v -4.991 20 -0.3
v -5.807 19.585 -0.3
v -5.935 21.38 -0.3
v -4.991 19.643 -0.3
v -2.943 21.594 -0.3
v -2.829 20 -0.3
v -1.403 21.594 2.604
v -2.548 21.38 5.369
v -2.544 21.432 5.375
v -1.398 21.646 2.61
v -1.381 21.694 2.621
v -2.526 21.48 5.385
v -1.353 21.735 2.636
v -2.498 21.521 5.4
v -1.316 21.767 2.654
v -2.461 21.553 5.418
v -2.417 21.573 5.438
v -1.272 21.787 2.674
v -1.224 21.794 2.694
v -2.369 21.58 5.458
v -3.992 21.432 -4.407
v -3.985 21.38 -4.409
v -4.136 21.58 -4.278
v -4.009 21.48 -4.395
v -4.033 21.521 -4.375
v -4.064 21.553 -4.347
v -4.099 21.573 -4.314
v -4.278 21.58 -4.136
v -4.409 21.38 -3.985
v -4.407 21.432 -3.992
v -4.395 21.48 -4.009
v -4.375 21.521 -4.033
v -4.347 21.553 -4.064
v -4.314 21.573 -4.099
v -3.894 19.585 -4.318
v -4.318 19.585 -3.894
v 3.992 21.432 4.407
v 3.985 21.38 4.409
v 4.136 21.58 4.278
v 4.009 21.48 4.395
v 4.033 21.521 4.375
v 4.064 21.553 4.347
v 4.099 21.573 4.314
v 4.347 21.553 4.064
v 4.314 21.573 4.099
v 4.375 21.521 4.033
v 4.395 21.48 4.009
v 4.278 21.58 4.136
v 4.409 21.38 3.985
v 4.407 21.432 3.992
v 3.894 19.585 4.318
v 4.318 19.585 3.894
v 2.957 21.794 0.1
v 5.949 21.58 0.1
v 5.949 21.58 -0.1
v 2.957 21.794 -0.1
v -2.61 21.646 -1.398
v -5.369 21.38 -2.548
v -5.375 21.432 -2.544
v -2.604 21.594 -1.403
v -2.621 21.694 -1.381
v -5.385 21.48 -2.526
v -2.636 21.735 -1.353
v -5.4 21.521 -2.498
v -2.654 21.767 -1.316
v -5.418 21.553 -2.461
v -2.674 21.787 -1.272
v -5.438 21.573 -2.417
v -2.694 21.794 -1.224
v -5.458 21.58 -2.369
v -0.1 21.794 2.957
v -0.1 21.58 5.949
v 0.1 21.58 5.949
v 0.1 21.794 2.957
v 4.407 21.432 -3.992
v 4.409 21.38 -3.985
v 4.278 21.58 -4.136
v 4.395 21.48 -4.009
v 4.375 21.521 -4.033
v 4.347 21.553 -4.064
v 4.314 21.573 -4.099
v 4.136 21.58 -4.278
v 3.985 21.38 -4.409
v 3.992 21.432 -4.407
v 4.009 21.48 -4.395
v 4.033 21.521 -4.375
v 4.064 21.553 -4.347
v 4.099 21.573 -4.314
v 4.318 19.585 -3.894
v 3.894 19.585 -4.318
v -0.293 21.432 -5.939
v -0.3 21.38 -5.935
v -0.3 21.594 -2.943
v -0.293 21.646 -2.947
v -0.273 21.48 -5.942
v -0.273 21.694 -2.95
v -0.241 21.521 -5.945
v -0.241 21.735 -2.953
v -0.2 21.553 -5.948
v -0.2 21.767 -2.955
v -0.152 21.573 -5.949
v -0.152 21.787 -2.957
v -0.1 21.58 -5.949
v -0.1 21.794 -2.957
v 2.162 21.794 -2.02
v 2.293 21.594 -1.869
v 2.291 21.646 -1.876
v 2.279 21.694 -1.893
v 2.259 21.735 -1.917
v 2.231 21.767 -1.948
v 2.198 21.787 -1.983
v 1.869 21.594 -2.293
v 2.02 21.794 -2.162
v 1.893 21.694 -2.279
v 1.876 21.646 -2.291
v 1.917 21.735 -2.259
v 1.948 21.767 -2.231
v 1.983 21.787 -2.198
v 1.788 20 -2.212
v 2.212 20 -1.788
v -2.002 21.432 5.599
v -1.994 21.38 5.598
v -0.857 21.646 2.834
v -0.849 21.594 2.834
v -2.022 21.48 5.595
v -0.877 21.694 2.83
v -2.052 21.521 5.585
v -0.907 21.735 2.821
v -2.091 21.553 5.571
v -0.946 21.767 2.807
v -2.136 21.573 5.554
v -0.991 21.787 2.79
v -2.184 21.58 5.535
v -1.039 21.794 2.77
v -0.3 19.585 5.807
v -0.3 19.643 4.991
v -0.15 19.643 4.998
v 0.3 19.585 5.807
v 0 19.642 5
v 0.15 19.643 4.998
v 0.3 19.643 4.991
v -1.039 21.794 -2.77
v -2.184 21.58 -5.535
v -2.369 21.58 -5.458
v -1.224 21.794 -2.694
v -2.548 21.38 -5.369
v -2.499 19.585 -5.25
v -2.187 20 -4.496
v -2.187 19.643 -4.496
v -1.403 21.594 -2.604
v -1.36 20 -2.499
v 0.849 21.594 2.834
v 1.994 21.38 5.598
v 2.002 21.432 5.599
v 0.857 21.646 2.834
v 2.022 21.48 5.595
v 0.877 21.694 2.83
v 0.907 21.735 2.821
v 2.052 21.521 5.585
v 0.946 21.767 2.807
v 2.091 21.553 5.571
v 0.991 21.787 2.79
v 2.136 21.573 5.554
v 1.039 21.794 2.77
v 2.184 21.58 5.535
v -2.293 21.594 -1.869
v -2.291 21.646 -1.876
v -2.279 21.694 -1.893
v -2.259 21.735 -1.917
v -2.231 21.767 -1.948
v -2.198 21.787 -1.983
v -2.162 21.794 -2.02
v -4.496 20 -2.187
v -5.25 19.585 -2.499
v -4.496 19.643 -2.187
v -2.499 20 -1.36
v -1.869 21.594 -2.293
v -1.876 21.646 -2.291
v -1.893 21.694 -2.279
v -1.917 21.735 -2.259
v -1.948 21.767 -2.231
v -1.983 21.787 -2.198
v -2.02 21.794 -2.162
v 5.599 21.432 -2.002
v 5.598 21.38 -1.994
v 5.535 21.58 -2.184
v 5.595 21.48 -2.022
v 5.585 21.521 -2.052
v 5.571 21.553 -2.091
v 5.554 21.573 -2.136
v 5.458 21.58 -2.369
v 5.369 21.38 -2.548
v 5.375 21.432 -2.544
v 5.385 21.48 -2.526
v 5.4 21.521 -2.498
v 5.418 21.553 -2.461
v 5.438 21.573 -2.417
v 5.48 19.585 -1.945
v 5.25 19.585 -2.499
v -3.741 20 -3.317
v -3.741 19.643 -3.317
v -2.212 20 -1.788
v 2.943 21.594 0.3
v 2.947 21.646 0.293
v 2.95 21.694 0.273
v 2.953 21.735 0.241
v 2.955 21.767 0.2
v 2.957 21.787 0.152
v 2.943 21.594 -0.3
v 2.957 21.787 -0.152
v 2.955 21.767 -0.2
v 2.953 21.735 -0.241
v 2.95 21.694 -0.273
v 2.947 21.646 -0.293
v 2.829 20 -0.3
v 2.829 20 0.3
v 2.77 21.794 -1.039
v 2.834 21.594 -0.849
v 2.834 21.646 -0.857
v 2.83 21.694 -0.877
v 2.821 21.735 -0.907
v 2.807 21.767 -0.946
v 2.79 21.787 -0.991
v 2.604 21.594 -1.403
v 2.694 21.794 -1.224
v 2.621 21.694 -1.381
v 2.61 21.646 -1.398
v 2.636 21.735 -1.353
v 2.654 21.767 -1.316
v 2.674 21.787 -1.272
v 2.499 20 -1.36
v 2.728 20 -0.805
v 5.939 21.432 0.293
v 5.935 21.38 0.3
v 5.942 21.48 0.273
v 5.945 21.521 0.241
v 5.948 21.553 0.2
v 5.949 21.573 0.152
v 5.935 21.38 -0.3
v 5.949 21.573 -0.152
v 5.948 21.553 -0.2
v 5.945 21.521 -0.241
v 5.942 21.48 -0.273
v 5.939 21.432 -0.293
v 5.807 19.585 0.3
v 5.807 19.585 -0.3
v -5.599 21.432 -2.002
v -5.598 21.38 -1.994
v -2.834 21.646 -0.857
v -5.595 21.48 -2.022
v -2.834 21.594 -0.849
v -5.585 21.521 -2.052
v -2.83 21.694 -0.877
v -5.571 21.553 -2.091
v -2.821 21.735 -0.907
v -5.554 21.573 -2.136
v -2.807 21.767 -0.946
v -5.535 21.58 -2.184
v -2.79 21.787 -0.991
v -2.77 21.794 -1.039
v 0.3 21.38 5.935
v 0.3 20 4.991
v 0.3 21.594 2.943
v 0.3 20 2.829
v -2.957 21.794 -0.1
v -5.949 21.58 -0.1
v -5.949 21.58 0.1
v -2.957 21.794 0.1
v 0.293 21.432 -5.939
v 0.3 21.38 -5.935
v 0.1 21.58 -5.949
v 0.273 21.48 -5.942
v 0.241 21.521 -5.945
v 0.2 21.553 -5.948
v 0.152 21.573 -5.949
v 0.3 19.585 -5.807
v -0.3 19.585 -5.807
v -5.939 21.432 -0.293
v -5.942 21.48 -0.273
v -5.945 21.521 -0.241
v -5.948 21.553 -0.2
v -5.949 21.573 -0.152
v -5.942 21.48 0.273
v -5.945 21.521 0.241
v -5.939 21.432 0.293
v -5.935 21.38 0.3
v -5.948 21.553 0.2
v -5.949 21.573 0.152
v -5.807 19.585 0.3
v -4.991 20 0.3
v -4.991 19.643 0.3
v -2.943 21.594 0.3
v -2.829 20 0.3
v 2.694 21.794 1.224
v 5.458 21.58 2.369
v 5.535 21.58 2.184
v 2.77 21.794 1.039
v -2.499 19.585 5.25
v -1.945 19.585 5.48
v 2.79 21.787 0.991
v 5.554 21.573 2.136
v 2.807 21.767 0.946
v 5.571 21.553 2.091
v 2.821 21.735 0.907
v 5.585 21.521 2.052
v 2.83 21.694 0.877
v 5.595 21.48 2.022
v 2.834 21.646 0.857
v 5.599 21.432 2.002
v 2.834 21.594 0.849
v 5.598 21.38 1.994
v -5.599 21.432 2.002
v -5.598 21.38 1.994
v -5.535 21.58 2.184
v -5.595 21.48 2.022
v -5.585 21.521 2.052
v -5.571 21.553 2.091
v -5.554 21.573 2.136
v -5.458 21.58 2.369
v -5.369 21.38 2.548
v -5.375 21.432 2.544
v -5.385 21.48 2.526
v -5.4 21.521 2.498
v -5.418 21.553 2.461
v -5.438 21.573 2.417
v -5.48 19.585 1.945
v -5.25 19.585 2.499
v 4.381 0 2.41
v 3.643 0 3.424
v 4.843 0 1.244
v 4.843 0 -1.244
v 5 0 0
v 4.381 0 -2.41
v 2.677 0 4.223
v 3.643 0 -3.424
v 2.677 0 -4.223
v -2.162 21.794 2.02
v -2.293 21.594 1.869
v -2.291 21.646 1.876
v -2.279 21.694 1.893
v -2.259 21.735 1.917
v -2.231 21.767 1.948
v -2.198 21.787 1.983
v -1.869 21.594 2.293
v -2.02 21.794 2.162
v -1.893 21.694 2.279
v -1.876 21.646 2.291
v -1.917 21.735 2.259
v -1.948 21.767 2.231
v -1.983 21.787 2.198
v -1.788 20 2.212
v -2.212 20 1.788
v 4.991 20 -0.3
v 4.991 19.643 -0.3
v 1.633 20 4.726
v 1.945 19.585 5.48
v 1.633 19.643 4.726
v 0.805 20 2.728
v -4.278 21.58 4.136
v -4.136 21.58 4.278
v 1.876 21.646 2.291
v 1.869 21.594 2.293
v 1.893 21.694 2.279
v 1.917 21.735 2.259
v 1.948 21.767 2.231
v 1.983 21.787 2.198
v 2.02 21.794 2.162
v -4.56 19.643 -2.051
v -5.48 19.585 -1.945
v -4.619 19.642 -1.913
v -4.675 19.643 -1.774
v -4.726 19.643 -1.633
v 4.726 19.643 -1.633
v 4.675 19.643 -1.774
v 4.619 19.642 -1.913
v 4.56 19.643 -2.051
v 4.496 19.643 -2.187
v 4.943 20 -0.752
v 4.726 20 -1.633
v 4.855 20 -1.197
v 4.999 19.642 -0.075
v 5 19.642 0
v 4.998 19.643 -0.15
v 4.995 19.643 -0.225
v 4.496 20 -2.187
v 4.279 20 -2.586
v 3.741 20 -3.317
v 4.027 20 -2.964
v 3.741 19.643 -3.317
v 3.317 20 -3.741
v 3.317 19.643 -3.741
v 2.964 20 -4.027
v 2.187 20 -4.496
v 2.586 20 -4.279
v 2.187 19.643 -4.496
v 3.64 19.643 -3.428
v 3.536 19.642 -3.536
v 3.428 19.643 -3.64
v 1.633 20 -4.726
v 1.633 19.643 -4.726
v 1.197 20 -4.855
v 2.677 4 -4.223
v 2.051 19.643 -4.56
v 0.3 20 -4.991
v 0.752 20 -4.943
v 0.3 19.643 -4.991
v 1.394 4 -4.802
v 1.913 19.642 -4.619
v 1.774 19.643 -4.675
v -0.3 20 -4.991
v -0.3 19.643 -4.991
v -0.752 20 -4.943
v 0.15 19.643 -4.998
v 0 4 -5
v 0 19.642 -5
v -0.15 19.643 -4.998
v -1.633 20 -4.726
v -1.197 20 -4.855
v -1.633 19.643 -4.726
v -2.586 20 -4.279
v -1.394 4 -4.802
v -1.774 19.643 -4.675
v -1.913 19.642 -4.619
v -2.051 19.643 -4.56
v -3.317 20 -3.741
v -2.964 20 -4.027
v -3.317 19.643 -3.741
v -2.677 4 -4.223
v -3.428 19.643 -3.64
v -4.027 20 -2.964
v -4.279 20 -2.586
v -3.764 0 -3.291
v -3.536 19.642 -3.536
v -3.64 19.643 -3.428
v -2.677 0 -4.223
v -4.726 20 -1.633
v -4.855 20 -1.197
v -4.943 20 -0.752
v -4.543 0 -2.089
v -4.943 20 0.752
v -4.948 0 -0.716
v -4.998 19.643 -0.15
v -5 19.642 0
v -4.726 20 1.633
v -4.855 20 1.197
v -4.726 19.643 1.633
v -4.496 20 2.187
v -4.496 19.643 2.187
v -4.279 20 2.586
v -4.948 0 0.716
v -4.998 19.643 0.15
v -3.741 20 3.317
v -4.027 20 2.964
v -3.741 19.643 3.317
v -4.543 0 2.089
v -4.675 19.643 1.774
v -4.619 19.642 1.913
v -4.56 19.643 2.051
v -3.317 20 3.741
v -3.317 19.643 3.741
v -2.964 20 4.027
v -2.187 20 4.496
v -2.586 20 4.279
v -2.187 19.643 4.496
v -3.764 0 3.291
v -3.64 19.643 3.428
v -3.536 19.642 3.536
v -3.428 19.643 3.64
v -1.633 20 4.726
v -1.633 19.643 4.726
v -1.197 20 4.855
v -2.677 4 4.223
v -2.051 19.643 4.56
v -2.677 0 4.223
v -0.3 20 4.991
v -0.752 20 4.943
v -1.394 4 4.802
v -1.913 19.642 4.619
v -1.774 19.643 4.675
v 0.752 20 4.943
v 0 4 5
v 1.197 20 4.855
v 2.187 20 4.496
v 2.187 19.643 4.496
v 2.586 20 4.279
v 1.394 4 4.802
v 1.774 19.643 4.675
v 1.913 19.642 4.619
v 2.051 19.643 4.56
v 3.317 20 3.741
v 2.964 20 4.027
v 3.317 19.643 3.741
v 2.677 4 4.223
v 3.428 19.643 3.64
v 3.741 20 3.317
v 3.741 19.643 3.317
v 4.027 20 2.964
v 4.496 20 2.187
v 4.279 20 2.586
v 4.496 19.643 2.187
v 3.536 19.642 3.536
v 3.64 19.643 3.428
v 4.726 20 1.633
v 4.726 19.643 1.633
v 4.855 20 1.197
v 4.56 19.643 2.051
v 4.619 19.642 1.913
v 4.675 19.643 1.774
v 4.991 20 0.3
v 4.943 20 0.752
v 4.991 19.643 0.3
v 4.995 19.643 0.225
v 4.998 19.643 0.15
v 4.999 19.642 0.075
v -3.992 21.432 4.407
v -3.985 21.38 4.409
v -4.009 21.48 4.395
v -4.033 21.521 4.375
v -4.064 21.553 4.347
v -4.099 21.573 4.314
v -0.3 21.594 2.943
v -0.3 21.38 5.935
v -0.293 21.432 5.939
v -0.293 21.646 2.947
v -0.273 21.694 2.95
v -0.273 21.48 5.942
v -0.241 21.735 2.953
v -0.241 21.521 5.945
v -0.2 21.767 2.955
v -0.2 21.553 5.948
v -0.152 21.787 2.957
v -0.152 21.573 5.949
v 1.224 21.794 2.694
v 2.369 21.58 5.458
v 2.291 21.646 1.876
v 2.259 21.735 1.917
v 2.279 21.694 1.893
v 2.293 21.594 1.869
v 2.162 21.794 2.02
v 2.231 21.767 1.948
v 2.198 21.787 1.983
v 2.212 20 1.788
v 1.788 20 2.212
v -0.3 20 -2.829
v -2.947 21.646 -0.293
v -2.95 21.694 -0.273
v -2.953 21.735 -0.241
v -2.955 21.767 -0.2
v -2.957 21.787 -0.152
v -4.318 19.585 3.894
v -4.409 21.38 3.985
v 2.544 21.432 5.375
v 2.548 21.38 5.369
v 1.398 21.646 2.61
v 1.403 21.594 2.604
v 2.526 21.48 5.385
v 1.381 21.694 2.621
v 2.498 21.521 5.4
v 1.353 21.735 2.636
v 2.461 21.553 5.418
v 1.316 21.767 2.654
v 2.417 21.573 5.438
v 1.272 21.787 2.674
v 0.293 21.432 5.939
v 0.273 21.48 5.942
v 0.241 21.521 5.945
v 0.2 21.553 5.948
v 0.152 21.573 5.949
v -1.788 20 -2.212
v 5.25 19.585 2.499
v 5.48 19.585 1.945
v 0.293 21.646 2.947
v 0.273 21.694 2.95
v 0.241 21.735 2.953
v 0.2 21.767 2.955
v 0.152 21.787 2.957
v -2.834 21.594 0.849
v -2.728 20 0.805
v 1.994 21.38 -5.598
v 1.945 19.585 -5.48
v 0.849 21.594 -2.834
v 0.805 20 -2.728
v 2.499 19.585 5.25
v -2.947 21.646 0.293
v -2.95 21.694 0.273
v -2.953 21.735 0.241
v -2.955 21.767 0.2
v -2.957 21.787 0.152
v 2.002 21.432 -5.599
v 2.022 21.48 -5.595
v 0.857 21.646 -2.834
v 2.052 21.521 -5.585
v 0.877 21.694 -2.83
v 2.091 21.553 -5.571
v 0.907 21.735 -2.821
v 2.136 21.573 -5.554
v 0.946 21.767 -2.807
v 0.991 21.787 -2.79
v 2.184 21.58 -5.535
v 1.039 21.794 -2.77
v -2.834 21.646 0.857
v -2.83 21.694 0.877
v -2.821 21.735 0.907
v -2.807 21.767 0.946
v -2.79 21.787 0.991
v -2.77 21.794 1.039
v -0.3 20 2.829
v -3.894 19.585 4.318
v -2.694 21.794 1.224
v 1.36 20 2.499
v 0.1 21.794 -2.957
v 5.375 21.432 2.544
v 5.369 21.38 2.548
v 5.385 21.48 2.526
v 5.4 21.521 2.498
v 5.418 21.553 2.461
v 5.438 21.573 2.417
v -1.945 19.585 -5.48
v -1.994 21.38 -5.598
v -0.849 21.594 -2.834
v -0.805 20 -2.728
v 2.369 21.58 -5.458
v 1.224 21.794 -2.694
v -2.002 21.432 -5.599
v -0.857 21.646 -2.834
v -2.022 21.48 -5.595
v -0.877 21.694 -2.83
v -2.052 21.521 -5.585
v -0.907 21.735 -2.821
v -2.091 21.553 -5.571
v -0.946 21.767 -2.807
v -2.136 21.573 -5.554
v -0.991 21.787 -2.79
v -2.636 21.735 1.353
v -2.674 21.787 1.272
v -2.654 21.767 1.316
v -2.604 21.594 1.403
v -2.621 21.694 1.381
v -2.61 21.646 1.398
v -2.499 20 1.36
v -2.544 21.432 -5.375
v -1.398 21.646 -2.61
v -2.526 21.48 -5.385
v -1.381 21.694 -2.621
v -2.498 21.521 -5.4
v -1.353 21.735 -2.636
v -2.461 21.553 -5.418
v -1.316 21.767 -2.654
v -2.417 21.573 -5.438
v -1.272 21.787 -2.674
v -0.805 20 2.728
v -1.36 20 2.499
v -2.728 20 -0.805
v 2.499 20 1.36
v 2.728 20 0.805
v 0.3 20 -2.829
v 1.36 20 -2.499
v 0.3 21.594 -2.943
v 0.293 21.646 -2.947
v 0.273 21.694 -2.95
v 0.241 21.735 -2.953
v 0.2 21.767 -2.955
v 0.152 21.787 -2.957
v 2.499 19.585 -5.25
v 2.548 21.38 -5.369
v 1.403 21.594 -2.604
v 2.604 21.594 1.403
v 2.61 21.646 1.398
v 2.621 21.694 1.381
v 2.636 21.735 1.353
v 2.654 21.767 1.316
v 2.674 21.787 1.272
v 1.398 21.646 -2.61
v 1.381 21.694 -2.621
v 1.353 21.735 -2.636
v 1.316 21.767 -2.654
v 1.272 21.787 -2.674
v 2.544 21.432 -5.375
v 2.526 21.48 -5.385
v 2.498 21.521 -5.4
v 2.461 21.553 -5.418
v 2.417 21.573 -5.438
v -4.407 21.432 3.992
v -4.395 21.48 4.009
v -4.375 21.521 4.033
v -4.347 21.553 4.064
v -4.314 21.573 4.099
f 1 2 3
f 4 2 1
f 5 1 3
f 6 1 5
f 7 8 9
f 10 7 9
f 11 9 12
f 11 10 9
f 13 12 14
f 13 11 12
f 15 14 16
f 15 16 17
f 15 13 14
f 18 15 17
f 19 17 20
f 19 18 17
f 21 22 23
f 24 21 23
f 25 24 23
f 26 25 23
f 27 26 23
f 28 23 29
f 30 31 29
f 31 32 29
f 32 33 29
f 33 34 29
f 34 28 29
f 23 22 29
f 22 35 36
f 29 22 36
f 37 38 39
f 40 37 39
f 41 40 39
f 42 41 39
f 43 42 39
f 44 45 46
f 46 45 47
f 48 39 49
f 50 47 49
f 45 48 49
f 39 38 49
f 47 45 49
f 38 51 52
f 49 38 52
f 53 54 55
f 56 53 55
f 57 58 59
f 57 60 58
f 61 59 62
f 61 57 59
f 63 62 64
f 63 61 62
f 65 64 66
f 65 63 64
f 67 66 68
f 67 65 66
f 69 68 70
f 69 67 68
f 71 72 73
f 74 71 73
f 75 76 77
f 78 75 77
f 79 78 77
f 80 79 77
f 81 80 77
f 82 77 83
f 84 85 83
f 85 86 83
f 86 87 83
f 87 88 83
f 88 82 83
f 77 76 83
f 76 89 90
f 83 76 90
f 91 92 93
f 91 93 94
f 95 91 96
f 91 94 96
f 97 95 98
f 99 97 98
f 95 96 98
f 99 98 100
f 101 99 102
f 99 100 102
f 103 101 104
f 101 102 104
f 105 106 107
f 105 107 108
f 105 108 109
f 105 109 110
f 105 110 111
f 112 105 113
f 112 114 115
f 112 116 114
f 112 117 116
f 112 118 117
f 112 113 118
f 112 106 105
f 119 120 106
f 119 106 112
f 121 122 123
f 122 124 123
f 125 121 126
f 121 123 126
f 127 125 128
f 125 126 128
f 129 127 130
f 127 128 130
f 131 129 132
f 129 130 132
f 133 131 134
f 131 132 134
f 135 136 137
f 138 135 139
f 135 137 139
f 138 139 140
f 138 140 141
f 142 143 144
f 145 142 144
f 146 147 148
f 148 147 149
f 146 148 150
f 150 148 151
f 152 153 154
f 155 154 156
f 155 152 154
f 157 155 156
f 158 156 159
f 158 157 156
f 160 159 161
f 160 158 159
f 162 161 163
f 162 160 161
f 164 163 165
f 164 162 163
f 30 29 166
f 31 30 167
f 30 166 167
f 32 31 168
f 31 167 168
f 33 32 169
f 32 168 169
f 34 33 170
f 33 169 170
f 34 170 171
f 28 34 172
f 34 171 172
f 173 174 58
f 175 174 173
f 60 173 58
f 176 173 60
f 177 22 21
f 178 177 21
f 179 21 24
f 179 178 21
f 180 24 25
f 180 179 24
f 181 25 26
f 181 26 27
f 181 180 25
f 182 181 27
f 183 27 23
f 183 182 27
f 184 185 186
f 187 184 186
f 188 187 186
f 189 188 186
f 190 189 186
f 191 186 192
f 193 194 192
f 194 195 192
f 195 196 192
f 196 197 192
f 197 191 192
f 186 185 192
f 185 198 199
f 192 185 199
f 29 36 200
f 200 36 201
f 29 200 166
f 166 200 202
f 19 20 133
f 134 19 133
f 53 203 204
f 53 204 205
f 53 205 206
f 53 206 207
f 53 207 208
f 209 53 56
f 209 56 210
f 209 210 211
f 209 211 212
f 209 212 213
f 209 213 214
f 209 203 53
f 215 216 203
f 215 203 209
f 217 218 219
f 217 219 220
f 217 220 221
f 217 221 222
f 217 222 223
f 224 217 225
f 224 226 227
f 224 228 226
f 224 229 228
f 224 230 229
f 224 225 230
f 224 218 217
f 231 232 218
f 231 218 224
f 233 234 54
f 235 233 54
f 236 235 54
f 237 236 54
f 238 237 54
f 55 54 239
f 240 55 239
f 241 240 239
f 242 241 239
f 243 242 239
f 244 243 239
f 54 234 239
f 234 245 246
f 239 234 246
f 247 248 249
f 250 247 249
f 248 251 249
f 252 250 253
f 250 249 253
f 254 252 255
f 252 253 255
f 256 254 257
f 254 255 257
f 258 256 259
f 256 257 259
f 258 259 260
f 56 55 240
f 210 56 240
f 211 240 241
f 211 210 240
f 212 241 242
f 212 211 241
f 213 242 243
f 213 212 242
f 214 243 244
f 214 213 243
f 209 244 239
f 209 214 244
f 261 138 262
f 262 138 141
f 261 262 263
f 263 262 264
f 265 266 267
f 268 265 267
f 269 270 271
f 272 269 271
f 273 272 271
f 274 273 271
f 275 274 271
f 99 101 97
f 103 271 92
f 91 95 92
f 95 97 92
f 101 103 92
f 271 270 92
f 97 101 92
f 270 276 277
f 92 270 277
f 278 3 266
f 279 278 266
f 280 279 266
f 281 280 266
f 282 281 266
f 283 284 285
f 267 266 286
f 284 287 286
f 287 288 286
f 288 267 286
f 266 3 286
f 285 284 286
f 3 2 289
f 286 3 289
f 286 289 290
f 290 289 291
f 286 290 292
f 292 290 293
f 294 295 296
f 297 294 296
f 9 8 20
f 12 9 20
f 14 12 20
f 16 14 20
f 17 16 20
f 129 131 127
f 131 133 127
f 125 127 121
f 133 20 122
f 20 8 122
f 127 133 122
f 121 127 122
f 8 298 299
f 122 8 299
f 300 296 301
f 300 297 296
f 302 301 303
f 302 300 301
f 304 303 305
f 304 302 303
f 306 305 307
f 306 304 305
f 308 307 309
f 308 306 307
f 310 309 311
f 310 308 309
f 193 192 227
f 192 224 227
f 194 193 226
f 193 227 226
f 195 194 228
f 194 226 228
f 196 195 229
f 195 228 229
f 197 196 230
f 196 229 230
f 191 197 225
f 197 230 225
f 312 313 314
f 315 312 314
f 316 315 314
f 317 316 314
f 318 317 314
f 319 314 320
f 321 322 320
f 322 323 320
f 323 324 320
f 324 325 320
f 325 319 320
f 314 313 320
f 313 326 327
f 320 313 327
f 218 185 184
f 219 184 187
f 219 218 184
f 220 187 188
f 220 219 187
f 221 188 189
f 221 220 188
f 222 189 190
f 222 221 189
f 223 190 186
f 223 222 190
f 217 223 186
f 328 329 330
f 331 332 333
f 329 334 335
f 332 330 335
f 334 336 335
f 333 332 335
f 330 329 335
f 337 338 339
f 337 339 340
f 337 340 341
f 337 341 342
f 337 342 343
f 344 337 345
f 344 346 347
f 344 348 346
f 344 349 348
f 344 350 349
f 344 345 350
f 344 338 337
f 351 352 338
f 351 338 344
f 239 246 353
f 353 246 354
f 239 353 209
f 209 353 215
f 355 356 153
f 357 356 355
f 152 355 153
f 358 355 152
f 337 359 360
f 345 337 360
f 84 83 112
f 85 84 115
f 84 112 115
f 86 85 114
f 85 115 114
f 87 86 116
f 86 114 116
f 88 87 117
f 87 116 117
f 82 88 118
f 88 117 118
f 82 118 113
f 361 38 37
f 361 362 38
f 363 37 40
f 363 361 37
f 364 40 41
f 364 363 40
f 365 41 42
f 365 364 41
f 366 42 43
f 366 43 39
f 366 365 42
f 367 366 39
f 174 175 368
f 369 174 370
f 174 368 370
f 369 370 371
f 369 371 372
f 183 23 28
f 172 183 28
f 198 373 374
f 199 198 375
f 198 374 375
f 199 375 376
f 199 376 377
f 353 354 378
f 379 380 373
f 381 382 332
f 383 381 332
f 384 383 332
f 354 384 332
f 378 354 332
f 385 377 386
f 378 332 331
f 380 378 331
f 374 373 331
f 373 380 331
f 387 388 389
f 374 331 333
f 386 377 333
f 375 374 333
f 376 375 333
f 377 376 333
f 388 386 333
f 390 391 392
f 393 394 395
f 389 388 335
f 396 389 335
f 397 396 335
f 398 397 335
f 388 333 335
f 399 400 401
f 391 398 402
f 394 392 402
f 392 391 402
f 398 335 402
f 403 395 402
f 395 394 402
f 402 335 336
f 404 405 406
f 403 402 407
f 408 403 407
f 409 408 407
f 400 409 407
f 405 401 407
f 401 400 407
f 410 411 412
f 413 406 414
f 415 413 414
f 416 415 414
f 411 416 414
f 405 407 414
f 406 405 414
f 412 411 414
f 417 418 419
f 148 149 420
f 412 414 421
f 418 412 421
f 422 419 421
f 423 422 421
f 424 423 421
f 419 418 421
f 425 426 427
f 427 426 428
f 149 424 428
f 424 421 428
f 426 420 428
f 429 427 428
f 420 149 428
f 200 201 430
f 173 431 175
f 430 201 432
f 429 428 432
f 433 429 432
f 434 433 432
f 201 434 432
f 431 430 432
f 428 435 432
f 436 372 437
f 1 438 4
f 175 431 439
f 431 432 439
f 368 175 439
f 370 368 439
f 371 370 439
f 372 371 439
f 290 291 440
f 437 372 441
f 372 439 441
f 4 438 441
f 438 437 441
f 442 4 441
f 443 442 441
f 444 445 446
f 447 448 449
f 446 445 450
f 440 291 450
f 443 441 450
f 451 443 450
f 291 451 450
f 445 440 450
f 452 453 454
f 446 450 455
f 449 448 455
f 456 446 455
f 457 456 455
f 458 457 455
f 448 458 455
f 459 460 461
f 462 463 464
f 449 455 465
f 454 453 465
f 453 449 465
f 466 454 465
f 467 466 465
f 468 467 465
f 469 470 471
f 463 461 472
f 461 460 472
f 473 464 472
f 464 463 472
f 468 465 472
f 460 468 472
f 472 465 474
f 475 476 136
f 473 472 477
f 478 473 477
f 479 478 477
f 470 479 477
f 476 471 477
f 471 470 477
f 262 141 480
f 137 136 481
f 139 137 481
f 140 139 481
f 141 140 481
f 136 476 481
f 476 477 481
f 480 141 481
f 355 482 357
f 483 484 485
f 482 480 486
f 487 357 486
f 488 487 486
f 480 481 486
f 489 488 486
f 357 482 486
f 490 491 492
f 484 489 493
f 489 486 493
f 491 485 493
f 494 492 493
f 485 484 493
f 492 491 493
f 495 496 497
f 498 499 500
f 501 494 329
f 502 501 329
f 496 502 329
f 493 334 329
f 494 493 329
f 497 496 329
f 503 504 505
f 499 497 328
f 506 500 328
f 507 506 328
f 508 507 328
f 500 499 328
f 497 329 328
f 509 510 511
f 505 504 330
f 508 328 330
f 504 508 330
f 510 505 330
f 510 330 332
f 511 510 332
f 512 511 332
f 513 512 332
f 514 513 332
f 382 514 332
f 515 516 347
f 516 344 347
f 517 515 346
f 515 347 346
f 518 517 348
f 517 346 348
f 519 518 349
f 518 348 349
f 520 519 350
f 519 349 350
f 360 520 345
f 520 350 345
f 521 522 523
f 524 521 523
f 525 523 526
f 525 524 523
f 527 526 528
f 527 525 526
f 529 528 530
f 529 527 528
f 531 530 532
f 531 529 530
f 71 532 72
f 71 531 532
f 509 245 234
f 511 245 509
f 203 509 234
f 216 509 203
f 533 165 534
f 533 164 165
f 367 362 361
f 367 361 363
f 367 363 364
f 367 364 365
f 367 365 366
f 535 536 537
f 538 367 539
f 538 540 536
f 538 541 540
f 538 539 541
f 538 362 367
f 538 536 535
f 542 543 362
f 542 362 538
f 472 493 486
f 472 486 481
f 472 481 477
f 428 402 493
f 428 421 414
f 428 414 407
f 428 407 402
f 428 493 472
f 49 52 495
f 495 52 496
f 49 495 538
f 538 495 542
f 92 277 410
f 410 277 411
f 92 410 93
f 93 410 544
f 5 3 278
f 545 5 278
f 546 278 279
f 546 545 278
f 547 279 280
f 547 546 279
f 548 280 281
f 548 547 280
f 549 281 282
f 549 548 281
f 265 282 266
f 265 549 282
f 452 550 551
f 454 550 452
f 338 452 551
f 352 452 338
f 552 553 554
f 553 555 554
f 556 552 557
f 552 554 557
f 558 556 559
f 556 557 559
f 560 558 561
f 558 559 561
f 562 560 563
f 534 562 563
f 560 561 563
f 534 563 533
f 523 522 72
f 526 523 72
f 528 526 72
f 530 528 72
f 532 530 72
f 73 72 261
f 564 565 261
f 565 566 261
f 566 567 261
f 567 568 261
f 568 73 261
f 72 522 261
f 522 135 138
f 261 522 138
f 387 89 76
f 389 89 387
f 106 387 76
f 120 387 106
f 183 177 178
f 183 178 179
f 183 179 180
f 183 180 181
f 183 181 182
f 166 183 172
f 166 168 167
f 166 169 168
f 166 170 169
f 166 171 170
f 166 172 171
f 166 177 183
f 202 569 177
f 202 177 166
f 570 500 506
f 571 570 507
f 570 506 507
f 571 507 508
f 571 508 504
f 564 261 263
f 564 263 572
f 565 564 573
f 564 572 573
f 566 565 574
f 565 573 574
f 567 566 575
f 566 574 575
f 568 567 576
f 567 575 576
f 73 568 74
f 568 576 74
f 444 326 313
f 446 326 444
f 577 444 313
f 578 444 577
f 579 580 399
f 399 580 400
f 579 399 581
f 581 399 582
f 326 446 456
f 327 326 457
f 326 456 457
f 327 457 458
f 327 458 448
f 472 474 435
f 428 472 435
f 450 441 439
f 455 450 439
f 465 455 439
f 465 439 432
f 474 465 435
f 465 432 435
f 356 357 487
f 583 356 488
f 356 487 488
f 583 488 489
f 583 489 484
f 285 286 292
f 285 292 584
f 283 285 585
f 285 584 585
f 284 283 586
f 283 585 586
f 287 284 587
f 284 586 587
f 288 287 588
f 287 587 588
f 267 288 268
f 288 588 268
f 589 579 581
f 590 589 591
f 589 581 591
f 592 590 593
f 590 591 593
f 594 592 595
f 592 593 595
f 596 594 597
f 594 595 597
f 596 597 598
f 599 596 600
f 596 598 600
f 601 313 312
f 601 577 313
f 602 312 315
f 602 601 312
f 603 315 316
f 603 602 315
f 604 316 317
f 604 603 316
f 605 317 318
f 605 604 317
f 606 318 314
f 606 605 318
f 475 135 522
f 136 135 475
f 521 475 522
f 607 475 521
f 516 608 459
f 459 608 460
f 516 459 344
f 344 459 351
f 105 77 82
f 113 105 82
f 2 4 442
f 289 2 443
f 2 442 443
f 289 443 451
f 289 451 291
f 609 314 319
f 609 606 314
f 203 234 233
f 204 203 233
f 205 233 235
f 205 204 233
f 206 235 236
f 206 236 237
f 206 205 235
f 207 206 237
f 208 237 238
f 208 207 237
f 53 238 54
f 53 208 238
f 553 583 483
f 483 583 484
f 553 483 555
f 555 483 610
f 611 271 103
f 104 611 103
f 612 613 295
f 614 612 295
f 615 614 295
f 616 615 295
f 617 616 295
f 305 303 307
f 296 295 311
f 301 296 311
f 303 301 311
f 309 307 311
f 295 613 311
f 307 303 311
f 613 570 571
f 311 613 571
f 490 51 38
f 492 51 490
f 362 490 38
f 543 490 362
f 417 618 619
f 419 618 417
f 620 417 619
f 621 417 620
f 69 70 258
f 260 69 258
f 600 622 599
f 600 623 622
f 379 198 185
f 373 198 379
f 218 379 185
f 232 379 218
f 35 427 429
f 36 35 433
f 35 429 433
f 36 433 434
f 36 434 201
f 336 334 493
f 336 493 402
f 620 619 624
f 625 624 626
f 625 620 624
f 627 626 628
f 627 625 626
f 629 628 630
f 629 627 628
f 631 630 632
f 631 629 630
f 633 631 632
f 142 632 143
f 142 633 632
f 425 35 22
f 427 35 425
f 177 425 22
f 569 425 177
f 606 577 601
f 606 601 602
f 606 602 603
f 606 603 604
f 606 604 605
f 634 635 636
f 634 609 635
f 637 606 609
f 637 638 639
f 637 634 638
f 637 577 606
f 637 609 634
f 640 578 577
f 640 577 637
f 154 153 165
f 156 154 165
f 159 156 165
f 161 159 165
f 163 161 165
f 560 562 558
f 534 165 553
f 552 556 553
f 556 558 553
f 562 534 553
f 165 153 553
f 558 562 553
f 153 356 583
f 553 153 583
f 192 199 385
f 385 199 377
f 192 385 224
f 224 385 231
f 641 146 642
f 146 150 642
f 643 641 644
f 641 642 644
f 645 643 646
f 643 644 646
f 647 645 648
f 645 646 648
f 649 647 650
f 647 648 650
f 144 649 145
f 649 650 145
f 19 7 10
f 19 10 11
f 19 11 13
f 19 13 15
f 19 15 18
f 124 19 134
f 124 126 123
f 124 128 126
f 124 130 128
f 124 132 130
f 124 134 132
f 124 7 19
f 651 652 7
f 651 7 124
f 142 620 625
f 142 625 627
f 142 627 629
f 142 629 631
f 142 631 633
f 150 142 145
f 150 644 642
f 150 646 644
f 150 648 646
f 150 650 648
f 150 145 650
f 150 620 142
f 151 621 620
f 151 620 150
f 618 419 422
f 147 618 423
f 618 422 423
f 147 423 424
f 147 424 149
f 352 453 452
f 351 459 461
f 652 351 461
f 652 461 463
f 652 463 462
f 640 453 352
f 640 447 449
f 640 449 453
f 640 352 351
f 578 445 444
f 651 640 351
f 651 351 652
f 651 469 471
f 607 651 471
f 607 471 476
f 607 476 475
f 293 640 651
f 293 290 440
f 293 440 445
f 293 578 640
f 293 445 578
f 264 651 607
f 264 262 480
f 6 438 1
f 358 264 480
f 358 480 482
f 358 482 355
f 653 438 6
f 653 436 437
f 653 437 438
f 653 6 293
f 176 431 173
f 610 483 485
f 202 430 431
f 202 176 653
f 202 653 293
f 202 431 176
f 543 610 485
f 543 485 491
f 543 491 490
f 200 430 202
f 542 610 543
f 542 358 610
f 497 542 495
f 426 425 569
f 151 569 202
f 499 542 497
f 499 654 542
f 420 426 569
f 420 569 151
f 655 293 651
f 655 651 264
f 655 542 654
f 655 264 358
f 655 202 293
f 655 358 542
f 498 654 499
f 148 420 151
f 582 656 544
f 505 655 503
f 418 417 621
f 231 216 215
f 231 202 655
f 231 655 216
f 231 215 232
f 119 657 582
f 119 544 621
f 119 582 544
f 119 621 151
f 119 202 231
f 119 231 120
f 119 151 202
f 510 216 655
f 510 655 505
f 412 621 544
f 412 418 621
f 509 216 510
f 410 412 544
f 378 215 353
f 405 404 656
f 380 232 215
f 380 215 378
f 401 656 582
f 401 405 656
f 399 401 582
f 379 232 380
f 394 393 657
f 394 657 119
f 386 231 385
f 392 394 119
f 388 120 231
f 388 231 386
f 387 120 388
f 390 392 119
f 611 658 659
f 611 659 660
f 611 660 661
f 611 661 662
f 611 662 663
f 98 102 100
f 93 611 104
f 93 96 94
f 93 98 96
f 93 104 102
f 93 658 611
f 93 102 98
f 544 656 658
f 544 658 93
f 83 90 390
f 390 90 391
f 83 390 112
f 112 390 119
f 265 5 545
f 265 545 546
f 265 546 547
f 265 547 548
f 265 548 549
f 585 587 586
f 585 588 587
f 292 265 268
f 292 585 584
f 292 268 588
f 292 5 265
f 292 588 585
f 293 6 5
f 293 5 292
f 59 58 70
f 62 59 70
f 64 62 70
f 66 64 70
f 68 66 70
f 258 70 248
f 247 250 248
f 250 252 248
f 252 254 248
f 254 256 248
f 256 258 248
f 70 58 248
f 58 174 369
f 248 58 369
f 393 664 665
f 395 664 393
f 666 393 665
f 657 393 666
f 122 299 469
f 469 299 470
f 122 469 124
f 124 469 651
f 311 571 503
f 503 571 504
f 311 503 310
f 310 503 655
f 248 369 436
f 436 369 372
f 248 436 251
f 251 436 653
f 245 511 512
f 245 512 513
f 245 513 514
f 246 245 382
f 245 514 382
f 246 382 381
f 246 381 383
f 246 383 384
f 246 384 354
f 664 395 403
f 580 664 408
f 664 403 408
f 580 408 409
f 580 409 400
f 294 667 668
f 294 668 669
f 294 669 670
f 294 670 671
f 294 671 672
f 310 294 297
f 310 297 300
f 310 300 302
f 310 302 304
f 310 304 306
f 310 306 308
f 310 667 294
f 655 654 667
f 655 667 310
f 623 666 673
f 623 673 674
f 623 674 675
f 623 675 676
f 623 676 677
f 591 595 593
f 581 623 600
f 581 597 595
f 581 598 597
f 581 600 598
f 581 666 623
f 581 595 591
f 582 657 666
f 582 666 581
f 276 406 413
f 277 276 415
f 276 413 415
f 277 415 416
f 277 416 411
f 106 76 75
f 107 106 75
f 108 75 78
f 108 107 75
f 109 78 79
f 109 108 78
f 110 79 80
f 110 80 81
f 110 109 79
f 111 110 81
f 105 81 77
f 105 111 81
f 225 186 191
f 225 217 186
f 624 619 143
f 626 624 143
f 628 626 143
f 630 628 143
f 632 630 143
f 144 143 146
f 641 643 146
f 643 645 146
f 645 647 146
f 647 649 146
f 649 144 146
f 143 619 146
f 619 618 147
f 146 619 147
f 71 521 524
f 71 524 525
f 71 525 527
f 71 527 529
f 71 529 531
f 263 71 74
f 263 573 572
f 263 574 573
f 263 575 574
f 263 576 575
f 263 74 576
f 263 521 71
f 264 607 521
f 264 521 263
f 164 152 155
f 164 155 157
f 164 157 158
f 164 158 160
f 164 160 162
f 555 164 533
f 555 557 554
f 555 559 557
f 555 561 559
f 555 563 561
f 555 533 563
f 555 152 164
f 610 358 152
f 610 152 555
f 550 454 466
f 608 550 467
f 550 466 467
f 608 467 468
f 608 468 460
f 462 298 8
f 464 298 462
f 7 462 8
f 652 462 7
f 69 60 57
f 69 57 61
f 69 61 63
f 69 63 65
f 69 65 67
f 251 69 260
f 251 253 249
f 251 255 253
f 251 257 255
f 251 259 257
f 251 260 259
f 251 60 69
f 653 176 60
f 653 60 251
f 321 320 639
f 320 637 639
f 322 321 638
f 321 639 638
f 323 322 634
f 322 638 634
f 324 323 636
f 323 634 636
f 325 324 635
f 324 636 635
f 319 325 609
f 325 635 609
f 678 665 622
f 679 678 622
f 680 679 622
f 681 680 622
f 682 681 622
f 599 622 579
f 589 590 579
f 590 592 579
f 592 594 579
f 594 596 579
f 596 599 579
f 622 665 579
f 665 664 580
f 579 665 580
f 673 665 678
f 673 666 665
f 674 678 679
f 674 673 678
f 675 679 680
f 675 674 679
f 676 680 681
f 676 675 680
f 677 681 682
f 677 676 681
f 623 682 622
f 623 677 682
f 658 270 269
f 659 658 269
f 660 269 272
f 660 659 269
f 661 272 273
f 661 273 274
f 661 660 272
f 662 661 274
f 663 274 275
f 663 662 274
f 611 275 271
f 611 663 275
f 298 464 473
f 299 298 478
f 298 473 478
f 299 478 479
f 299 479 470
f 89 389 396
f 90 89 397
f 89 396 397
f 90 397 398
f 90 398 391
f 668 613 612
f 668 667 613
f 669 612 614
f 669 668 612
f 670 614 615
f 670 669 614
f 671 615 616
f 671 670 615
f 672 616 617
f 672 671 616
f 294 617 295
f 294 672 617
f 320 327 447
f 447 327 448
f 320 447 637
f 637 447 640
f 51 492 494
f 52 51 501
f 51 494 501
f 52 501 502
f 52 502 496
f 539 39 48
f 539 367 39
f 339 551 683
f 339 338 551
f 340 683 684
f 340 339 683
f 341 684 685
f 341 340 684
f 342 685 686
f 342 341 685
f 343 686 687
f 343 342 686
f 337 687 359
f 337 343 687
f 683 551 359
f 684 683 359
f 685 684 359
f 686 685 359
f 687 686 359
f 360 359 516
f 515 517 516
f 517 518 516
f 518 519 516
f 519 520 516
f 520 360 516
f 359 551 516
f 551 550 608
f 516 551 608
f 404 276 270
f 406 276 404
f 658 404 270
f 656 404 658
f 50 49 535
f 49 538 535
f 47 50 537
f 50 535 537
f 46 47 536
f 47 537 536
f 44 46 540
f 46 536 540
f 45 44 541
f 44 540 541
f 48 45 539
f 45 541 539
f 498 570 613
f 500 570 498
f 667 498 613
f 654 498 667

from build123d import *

# Parameters (mm, degrees)
SKETCH_1_R                       = 5
EXTRUDE_1_DEPTH                  = 20
SKETCH_3_W                       = 0.6
SKETCH_3_H                       = 3
EXTRUDE_2_DEPTH                  = 2
FILLET_1_R                       = 0.2
PATTERN_CIRCULAR_3_COUNT         = 16
FILLET_1_OF_PATTERN_CIRCULAR_3_R = 0.2
SKETCH_4_W                       = 5.353265718
SKETCH_4_H                       = 11.52836058
CUT_EXTRUDE_1_DEPTH              = 4


with BuildPart() as part:
    # 草图1 → 凸台-拉伸1 (new body)
    with BuildSketch(Plane(origin=(0, 0, 0), x_dir=(1, 0, 0), z_dir=(0, 1, 0))):
        Circle(SKETCH_1_R)
    extrude(amount=EXTRUDE_1_DEPTH)

    # 草图3 → 凸台-拉伸2 (add)
    with BuildSketch(Plane(origin=(1.423145242, 19.89821487, 0), x_dir=(0, 0, -1), z_dir=(0.071339025, 0.997452126, 0))):
        with Locations((0, -2.894865204)):
            Rectangle(SKETCH_3_W, SKETCH_3_H)
    extrude_2 = extrude(amount=EXTRUDE_2_DEPTH)

    # 圆角1
    fillet_1_edges = [part.edges().sort_by_distance(p)[0] for p in [
        (4.453312743, 21.686602261, -0.3),
        (4.453312743, 21.686602261, 0.3),
    ]]
    fillet(fillet_1_edges, radius=FILLET_1_R)

    # 阵列(圆周)3: 凸台-拉伸2 ×16 about axis
    pattern_circular_3_axis = Axis((0, 0, 0), (0, 1, 0))
    for i in range(1, PATTERN_CIRCULAR_3_COUNT):
        add(extrude_2.rotate(pattern_circular_3_axis, i * 360 / PATTERN_CIRCULAR_3_COUNT))

    # 圆角1 of 阵列(圆周)3
    fillet_1_of_pattern_circular_3_edges = [part.edges().sort_by_distance(p)[0] for p in [
        (3.999519466, 21.686602261, -1.981372866),
        (4.229129525, 21.686602261, -1.427045146),
        (2.936835605, 21.686602261, -3.361099674),
        (3.361099674, 21.686602261, -2.936835605),
        (1.427045146, 21.686602261, -4.229129525),
        (1.981372866, 21.686602261, -3.999519466),
        (-0.3, 21.686602261, -4.453312743),
        (0.3, 21.686602261, -4.453312743),
        (-1.981372866, 21.686602261, -3.999519466),
        (-1.427045146, 21.686602261, -4.229129525),
        (-3.361099674, 21.686602261, -2.936835605),
        (-2.936835605, 21.686602261, -3.361099674),
        (-4.229129525, 21.686602261, -1.427045146),
        (-3.999519466, 21.686602261, -1.981372866),
        (-4.453312743, 21.686602261, 0.3),
        (-4.453312743, 21.686602261, -0.3),
        (-3.999519466, 21.686602261, 1.981372866),
        (-4.229129525, 21.686602261, 1.427045146),
        (-2.936835605, 21.686602261, 3.361099674),
        (-3.361099674, 21.686602261, 2.936835605),
        (-1.427045146, 21.686602261, 4.229129525),
        (-1.981372866, 21.686602261, 3.999519466),
        (0.3, 21.686602261, 4.453312743),
        (-0.3, 21.686602261, 4.453312743),
        (1.981372866, 21.686602261, 3.999519466),
        (1.427045146, 21.686602261, 4.229129525),
        (3.361099674, 21.686602261, 2.936835605),
        (2.936835605, 21.686602261, 3.361099674),
        (4.229129525, 21.686602261, 1.427045146),
        (3.999519466, 21.686602261, 1.981372866),
    ]]
    fillet(fillet_1_of_pattern_circular_3_edges, radius=FILLET_1_OF_PATTERN_CIRCULAR_3_R)

    # 草图4 → 切除-拉伸1 (cut)
    with BuildSketch(Plane(origin=(0, 0, 0), x_dir=(-1, 0, 0), z_dir=(0, -1, 0))):
        Rectangle(SKETCH_4_W, SKETCH_4_H)
    extrude(amount=-CUT_EXTRUDE_1_DEPTH, mode=Mode.SUBTRACT)


solid = part.part
